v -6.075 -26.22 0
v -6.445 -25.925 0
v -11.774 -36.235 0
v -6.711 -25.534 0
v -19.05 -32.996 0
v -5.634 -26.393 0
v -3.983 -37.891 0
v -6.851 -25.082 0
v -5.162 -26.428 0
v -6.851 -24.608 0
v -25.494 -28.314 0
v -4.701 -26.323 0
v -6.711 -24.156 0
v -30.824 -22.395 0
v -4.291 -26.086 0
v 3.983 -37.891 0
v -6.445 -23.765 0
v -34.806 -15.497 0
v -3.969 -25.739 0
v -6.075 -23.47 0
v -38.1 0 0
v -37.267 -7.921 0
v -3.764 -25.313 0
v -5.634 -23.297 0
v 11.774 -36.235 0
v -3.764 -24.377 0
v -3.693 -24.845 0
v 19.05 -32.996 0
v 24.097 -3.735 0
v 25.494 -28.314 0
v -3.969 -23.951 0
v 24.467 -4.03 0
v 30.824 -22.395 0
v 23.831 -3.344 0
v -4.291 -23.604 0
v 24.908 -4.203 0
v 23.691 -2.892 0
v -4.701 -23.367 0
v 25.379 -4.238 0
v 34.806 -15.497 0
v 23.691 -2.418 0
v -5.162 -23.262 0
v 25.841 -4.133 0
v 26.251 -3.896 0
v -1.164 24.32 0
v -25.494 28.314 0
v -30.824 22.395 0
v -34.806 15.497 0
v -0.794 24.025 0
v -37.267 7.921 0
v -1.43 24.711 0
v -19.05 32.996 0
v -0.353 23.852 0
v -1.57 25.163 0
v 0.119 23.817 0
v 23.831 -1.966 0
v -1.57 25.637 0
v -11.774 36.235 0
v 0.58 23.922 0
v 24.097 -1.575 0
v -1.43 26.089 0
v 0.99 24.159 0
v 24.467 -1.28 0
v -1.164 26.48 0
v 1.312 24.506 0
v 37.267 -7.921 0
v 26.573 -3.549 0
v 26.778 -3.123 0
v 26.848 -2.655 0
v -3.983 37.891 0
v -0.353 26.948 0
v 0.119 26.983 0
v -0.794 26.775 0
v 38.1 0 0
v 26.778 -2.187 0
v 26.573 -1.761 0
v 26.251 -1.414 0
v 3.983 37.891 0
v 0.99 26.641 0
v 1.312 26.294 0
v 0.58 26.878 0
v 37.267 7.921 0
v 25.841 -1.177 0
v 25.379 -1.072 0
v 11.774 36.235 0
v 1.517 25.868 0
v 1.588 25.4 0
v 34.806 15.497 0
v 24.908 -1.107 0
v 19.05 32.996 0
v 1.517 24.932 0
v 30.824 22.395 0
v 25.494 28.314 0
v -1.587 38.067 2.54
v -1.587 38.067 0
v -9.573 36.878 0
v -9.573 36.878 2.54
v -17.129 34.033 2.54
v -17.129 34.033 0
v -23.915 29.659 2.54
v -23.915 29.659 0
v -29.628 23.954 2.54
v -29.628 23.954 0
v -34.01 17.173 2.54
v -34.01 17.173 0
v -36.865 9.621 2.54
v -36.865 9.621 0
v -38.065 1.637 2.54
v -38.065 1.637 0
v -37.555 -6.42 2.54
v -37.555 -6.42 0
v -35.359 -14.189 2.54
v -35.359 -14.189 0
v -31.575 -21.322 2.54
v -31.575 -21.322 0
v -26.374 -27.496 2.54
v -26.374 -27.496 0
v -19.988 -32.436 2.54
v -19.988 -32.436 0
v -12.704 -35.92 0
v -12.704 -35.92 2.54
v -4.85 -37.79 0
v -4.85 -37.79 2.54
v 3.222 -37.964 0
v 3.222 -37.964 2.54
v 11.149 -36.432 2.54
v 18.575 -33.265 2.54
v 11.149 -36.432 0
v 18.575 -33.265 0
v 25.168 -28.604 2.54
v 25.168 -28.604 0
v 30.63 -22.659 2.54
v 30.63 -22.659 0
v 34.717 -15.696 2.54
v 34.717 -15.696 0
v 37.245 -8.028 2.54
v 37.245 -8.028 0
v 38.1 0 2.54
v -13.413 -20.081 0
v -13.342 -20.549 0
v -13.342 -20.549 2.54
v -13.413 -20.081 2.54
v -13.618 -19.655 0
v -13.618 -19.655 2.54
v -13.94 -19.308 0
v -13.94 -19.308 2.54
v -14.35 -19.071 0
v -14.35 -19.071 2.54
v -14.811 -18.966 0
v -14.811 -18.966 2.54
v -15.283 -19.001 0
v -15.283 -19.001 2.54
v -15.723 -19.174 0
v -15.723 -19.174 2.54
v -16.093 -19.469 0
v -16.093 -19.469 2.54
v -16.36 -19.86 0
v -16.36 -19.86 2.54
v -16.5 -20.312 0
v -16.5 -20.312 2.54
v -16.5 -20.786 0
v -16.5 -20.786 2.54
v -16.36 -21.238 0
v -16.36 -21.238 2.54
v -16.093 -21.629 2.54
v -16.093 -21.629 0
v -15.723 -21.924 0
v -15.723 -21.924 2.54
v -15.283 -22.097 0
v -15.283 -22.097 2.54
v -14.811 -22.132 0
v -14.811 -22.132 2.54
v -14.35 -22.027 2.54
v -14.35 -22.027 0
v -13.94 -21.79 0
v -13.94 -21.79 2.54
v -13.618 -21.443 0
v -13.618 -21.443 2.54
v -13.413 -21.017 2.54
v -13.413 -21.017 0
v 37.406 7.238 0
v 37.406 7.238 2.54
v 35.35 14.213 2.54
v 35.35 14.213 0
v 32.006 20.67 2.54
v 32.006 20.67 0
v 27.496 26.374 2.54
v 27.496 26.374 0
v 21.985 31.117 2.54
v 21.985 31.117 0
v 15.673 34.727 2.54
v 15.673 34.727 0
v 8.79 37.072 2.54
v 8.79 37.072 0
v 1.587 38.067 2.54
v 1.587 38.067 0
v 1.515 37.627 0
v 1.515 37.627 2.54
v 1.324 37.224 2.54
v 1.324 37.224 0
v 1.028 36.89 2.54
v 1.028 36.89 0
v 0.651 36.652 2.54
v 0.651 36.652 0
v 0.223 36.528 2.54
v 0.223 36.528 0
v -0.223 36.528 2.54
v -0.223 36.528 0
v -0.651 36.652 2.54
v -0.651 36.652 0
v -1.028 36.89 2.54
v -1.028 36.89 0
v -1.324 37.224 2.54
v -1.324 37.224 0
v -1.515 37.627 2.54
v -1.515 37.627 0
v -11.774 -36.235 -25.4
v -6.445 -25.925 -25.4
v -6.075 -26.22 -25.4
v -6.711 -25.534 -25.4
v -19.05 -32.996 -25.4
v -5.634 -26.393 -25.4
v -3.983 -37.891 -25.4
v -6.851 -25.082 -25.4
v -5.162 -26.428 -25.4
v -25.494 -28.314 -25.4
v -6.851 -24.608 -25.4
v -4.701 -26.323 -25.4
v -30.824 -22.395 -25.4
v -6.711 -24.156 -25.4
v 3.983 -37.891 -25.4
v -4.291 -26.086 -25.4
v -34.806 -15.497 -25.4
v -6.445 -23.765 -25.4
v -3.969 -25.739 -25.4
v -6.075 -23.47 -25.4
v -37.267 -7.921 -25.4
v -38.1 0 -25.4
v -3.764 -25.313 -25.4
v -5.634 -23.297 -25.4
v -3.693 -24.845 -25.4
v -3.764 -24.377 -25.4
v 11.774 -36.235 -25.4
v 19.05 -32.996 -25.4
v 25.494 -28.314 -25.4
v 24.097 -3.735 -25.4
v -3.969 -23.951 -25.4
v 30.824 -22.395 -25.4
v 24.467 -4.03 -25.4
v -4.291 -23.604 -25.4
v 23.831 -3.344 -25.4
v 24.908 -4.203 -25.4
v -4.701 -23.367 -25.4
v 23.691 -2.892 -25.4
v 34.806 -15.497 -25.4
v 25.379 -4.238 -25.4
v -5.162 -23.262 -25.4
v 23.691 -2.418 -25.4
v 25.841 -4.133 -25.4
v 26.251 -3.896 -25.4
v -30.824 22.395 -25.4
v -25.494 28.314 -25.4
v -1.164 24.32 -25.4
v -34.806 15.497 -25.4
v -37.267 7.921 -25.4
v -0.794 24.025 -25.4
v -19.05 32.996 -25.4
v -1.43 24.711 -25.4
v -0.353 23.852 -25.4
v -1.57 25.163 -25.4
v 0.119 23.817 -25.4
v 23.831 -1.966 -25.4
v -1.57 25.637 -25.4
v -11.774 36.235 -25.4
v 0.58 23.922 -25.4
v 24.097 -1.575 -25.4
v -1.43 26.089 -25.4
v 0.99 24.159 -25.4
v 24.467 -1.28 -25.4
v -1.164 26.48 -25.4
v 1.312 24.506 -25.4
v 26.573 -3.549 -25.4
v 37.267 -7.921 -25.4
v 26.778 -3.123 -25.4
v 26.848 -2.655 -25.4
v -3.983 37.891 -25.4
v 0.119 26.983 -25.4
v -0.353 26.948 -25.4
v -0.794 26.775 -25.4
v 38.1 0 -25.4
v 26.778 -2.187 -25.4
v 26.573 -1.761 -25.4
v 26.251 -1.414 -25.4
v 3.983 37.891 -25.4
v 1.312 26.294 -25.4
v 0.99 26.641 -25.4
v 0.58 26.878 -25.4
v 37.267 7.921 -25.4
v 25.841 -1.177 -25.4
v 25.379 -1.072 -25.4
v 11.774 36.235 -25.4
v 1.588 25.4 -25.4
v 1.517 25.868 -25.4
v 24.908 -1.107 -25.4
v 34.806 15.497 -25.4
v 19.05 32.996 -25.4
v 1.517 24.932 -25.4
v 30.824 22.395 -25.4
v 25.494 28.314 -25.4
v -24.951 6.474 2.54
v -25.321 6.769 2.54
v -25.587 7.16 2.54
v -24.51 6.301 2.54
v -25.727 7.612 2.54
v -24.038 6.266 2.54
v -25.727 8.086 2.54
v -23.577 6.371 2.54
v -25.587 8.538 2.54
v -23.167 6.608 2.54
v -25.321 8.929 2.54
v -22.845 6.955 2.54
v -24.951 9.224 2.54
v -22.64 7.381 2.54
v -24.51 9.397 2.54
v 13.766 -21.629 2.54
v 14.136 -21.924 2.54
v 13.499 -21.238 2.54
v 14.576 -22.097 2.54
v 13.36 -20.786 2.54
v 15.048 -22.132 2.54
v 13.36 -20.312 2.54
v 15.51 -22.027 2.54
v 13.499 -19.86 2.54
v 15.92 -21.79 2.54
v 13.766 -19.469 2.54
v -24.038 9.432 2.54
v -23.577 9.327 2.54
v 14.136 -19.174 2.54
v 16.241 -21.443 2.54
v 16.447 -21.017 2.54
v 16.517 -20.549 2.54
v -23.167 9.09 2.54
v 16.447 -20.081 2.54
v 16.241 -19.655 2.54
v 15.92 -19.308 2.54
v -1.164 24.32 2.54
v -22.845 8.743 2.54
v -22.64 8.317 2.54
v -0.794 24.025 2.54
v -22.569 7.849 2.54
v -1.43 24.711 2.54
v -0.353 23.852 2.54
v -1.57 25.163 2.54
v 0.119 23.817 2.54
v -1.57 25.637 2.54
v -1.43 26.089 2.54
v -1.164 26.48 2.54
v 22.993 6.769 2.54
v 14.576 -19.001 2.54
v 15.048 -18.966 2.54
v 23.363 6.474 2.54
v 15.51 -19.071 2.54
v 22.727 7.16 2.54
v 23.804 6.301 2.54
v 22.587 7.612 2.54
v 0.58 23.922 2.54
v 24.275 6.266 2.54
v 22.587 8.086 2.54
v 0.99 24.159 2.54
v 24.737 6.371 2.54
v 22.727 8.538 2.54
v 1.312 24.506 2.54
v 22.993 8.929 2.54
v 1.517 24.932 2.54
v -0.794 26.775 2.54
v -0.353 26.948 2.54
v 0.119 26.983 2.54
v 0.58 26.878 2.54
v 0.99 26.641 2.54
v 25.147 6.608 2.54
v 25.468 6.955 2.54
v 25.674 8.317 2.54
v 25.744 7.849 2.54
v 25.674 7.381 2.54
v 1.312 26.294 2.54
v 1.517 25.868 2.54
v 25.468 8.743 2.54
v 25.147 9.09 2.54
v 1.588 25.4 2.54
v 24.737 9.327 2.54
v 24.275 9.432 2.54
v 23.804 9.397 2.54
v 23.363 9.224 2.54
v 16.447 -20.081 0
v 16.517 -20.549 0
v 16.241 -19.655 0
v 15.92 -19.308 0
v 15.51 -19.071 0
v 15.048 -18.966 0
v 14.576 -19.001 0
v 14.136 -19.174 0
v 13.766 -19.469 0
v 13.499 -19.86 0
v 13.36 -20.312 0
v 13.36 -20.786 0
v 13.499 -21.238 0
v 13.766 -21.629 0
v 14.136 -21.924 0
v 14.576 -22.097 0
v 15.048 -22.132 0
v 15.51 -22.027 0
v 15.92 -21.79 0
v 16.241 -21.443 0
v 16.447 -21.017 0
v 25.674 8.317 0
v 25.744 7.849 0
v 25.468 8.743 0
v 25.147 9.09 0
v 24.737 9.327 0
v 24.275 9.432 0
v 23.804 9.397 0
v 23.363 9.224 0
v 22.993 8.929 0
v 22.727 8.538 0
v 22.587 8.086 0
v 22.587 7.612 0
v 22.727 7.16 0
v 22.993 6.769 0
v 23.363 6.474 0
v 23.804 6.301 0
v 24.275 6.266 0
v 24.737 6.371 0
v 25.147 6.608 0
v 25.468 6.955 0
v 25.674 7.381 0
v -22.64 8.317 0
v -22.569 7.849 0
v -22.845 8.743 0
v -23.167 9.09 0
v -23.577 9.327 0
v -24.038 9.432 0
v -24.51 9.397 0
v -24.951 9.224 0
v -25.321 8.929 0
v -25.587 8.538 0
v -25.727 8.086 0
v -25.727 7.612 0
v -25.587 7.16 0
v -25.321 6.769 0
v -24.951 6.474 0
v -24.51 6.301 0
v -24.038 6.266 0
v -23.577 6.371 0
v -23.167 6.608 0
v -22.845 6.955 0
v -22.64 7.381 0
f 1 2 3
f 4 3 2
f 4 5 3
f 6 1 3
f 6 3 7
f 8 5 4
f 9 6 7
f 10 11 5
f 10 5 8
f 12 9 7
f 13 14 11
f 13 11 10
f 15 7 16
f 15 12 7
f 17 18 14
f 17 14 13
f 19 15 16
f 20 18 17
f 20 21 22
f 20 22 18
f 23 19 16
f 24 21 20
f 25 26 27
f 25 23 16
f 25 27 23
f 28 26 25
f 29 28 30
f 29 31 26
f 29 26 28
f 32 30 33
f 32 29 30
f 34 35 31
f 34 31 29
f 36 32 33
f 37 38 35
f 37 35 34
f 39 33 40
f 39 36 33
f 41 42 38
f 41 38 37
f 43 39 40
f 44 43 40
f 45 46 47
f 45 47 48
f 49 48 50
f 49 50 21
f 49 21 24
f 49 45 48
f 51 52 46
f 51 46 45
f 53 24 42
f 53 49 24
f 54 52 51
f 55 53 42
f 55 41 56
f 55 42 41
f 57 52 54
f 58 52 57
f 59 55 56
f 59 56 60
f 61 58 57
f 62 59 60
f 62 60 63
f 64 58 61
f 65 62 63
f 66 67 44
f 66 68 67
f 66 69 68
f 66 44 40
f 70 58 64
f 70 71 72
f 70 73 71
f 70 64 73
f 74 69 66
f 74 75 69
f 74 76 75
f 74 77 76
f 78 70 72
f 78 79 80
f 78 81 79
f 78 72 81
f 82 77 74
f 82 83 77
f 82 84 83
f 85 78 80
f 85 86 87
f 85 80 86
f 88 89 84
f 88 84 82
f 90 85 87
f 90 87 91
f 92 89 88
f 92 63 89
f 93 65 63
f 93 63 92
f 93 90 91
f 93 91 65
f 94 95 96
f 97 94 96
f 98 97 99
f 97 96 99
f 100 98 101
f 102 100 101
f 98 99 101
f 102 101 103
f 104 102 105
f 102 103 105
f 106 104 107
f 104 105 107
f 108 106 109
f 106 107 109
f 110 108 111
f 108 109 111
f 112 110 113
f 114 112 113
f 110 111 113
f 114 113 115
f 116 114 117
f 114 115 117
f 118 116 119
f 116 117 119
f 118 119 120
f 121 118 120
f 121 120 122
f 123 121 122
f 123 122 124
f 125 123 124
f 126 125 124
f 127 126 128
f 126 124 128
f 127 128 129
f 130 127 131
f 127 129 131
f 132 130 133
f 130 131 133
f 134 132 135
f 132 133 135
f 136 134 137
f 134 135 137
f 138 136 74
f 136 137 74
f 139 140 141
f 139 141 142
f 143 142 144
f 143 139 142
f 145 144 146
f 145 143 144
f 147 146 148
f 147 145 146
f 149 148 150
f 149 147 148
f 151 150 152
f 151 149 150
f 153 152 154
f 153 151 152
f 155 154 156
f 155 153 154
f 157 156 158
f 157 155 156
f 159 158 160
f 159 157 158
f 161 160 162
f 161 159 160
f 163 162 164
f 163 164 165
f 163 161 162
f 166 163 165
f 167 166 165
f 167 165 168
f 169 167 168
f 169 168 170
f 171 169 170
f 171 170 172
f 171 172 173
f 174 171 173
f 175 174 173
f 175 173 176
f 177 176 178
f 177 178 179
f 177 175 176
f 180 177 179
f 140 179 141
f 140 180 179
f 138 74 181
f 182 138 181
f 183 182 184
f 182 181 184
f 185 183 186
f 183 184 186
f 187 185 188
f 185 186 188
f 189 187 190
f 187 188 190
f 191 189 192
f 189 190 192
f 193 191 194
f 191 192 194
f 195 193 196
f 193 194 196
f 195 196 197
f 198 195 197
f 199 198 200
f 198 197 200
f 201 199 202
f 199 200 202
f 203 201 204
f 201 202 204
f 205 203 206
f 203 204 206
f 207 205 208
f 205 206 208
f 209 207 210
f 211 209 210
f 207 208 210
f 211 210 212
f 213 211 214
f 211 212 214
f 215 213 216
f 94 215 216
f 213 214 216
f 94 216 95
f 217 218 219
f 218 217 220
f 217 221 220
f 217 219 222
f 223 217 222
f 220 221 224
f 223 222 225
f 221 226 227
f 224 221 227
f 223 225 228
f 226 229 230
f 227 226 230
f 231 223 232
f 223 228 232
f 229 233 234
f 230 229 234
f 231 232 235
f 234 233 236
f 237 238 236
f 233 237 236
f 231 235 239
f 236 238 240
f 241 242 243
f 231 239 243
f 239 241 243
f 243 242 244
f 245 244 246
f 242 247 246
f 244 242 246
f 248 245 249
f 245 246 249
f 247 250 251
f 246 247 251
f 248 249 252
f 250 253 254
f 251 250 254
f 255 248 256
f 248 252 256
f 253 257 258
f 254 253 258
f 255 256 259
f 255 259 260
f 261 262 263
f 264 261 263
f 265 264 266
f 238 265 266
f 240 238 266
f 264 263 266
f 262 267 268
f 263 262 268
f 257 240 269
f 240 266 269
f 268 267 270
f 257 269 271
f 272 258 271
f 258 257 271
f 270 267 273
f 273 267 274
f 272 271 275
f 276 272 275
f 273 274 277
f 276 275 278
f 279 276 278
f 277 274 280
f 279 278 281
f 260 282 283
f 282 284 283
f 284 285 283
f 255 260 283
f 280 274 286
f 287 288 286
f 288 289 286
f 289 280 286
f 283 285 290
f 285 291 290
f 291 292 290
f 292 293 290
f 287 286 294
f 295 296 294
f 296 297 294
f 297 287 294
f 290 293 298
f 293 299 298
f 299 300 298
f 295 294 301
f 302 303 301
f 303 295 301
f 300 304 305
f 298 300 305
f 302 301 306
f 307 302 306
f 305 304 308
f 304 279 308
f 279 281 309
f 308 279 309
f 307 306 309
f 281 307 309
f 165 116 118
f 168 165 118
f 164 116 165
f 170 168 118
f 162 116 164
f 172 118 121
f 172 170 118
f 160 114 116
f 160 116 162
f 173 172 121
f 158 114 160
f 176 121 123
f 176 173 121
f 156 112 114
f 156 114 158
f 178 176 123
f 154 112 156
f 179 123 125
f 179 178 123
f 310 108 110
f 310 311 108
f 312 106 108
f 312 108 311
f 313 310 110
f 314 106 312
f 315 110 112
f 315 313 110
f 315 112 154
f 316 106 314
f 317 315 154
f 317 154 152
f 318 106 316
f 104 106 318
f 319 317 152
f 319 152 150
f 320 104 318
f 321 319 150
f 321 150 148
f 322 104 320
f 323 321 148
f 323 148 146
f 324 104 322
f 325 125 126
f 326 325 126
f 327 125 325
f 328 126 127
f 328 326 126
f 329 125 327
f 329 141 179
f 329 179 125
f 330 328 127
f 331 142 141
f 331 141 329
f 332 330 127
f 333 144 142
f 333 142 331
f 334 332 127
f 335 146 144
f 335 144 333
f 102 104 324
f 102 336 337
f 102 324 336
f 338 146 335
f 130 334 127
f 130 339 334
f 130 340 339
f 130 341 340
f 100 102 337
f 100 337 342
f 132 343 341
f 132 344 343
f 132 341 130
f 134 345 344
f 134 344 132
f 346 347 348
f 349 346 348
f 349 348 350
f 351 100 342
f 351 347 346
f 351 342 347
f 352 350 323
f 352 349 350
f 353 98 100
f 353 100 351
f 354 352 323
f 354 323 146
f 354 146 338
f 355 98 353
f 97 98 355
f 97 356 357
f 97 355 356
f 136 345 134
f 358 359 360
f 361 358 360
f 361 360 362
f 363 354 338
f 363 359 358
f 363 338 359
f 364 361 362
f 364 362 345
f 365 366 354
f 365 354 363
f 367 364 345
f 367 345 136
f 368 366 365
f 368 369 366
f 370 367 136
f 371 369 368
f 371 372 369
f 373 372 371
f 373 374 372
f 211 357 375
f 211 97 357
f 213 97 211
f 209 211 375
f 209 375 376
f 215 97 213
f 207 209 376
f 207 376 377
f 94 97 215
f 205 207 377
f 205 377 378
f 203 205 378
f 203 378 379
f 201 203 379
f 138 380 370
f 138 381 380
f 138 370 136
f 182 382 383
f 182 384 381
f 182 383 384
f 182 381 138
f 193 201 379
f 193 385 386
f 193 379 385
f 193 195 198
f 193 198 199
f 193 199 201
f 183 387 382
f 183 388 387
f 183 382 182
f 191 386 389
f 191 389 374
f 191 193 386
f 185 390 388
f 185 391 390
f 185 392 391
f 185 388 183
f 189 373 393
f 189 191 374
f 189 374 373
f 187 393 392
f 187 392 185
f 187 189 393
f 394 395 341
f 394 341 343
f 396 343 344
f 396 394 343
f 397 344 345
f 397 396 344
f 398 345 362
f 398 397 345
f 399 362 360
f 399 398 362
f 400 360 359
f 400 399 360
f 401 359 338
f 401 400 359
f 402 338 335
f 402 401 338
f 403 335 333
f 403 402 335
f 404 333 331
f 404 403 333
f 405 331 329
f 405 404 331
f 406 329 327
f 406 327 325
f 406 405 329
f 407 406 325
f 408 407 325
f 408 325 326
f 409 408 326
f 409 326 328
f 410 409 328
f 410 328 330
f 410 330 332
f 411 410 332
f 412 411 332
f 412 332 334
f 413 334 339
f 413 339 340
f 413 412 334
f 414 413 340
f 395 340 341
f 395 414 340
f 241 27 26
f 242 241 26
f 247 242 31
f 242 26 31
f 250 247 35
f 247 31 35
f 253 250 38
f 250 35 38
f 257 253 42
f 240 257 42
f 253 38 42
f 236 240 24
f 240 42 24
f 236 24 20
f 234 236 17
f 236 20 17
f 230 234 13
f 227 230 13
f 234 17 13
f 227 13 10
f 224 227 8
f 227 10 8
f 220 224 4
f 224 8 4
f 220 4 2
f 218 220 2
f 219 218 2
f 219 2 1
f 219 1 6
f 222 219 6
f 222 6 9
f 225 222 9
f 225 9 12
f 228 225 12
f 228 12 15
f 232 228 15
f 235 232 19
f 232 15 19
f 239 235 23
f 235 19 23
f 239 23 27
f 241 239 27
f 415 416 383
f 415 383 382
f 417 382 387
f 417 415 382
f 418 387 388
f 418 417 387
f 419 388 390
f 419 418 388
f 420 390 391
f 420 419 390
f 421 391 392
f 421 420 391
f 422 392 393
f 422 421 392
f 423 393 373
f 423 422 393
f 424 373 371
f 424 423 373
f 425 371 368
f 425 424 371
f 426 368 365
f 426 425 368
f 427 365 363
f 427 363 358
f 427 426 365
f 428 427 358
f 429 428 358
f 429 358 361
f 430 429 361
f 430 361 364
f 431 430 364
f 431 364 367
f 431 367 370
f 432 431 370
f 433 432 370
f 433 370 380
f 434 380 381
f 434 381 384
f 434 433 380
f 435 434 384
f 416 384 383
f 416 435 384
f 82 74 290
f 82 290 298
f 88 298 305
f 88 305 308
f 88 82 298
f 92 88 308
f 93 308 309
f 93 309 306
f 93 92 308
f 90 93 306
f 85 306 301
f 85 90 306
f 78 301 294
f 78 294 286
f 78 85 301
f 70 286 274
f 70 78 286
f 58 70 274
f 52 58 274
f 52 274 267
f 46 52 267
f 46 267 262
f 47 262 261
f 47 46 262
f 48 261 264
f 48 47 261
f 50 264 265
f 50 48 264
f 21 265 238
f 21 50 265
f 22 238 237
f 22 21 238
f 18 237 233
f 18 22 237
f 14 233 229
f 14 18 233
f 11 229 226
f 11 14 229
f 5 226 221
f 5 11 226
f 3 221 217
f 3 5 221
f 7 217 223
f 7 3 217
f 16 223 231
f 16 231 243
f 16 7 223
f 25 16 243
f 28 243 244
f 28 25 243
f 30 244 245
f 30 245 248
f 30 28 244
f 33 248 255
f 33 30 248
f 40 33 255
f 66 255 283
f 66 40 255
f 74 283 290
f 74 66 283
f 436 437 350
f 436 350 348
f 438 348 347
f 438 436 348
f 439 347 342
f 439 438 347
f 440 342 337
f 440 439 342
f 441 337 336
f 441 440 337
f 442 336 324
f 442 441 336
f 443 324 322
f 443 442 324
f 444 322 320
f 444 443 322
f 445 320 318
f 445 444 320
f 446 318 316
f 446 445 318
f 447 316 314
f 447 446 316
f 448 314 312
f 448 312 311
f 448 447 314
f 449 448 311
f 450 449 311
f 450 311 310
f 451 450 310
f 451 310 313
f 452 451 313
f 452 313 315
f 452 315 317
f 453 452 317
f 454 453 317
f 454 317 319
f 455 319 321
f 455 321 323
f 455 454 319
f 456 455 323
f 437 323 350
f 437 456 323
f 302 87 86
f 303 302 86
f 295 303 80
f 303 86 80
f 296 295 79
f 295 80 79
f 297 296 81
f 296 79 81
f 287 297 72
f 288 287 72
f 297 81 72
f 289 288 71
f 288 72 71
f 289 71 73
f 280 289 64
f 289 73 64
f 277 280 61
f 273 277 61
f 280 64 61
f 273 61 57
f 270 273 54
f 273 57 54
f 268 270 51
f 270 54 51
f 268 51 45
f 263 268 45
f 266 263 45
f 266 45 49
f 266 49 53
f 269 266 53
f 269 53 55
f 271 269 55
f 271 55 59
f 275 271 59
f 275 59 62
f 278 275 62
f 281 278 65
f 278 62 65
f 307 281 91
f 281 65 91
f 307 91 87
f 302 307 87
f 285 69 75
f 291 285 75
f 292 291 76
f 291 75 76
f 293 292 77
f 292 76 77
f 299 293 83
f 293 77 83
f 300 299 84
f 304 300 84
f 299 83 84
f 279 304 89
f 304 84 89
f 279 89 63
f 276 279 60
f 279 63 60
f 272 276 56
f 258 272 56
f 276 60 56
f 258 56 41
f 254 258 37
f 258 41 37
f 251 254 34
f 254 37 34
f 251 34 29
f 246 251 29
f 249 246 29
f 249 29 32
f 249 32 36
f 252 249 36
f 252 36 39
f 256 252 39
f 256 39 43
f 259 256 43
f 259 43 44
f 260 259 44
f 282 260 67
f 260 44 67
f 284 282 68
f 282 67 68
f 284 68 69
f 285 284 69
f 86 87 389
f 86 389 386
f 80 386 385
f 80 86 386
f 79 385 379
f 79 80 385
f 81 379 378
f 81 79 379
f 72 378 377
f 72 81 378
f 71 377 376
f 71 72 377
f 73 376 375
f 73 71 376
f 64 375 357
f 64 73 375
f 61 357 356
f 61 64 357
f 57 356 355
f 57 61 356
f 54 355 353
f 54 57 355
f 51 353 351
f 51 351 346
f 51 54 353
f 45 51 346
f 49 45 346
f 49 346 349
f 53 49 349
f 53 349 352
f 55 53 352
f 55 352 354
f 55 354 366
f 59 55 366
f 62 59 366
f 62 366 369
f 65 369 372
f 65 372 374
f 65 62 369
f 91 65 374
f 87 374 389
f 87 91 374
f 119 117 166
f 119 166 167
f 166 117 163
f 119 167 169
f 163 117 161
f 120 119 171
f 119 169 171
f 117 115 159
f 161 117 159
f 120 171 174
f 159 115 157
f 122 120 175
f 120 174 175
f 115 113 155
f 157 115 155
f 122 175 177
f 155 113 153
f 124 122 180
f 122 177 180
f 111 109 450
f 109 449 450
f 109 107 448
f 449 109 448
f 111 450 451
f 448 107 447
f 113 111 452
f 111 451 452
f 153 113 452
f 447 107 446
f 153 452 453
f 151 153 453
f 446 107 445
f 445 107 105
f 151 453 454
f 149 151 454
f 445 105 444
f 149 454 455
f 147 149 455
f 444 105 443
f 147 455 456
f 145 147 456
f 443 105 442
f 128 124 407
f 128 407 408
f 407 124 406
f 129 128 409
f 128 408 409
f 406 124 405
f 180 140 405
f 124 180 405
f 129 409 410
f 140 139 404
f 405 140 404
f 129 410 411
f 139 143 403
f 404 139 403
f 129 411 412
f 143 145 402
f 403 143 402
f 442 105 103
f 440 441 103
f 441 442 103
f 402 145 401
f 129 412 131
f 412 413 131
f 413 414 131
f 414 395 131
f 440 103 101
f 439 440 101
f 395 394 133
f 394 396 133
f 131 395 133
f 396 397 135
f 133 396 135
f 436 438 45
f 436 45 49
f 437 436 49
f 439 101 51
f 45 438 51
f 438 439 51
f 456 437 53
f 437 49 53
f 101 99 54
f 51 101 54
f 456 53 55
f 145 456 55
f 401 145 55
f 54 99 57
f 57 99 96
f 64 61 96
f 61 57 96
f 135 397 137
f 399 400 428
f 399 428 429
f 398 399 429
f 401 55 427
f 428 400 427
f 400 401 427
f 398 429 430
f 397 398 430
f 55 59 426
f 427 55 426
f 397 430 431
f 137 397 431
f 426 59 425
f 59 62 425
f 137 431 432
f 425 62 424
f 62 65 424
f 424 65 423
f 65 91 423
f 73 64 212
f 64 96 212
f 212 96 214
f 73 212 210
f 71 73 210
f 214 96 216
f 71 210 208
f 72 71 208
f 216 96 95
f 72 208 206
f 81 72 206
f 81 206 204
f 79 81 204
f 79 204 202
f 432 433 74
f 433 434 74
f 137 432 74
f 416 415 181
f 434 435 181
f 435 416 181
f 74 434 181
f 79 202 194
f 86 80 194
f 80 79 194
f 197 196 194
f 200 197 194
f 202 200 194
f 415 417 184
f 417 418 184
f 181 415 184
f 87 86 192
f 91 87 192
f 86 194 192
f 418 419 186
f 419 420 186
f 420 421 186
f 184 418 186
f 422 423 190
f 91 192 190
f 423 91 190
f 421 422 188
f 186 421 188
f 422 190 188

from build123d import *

# Parameters (mm, degrees)
F1_R     = 38.1
F1_R_2   = 1.5875
F2_DEPTH = 25.4
F0_R     = 1.5875
F3_DEPTH = 2.54


with BuildPart() as f2:
    # F1 (on Top) → F2 (new body)
    with BuildSketch(Plane.XY):
        Circle(F1_R)
        with Locations((-5.280957, -24.844949)):
            Circle(F1_R_2, mode=Mode.SUBTRACT)
        with Locations((25.260856, -2.655023)):
            Circle(F1_R_2, mode=Mode.SUBTRACT)
        with Locations((0, 25.4)):
            Circle(F1_R_2, mode=Mode.SUBTRACT)
    extrude(amount=-F2_DEPTH)


with BuildPart() as f3:
    # F0 (on Top) → F3 (new body)
    with BuildSketch(Plane.XY):
        with BuildLine():
            ThreePointArc((-1.587155, 38.066927), (-26.373655, -27.496187), (38.1, 0))
            ThreePointArc((38.1, 0), (27.496187, 26.373655), (1.587155, 38.066927))
            ThreePointArc((1.587155, 38.066927), (0, 36.5125), (-1.587155, 38.066927))
        make_face()
        with Locations((-14.929745, -20.549032)):
            Circle(F0_R, mode=Mode.SUBTRACT)
        with Locations((14.929745, -20.549032)):
            Circle(F0_R, mode=Mode.SUBTRACT)
        with Locations((-24.156836, 7.849032)):
            Circle(F0_R, mode=Mode.SUBTRACT)
        with Locations((24.156836, 7.849032)):
            Circle(F0_R, mode=Mode.SUBTRACT)
        with Locations((0, 25.4)):
            Circle(F0_R, mode=Mode.SUBTRACT)
    extrude(amount=F3_DEPTH)


solid = Compound([f2.part, f3.part])
